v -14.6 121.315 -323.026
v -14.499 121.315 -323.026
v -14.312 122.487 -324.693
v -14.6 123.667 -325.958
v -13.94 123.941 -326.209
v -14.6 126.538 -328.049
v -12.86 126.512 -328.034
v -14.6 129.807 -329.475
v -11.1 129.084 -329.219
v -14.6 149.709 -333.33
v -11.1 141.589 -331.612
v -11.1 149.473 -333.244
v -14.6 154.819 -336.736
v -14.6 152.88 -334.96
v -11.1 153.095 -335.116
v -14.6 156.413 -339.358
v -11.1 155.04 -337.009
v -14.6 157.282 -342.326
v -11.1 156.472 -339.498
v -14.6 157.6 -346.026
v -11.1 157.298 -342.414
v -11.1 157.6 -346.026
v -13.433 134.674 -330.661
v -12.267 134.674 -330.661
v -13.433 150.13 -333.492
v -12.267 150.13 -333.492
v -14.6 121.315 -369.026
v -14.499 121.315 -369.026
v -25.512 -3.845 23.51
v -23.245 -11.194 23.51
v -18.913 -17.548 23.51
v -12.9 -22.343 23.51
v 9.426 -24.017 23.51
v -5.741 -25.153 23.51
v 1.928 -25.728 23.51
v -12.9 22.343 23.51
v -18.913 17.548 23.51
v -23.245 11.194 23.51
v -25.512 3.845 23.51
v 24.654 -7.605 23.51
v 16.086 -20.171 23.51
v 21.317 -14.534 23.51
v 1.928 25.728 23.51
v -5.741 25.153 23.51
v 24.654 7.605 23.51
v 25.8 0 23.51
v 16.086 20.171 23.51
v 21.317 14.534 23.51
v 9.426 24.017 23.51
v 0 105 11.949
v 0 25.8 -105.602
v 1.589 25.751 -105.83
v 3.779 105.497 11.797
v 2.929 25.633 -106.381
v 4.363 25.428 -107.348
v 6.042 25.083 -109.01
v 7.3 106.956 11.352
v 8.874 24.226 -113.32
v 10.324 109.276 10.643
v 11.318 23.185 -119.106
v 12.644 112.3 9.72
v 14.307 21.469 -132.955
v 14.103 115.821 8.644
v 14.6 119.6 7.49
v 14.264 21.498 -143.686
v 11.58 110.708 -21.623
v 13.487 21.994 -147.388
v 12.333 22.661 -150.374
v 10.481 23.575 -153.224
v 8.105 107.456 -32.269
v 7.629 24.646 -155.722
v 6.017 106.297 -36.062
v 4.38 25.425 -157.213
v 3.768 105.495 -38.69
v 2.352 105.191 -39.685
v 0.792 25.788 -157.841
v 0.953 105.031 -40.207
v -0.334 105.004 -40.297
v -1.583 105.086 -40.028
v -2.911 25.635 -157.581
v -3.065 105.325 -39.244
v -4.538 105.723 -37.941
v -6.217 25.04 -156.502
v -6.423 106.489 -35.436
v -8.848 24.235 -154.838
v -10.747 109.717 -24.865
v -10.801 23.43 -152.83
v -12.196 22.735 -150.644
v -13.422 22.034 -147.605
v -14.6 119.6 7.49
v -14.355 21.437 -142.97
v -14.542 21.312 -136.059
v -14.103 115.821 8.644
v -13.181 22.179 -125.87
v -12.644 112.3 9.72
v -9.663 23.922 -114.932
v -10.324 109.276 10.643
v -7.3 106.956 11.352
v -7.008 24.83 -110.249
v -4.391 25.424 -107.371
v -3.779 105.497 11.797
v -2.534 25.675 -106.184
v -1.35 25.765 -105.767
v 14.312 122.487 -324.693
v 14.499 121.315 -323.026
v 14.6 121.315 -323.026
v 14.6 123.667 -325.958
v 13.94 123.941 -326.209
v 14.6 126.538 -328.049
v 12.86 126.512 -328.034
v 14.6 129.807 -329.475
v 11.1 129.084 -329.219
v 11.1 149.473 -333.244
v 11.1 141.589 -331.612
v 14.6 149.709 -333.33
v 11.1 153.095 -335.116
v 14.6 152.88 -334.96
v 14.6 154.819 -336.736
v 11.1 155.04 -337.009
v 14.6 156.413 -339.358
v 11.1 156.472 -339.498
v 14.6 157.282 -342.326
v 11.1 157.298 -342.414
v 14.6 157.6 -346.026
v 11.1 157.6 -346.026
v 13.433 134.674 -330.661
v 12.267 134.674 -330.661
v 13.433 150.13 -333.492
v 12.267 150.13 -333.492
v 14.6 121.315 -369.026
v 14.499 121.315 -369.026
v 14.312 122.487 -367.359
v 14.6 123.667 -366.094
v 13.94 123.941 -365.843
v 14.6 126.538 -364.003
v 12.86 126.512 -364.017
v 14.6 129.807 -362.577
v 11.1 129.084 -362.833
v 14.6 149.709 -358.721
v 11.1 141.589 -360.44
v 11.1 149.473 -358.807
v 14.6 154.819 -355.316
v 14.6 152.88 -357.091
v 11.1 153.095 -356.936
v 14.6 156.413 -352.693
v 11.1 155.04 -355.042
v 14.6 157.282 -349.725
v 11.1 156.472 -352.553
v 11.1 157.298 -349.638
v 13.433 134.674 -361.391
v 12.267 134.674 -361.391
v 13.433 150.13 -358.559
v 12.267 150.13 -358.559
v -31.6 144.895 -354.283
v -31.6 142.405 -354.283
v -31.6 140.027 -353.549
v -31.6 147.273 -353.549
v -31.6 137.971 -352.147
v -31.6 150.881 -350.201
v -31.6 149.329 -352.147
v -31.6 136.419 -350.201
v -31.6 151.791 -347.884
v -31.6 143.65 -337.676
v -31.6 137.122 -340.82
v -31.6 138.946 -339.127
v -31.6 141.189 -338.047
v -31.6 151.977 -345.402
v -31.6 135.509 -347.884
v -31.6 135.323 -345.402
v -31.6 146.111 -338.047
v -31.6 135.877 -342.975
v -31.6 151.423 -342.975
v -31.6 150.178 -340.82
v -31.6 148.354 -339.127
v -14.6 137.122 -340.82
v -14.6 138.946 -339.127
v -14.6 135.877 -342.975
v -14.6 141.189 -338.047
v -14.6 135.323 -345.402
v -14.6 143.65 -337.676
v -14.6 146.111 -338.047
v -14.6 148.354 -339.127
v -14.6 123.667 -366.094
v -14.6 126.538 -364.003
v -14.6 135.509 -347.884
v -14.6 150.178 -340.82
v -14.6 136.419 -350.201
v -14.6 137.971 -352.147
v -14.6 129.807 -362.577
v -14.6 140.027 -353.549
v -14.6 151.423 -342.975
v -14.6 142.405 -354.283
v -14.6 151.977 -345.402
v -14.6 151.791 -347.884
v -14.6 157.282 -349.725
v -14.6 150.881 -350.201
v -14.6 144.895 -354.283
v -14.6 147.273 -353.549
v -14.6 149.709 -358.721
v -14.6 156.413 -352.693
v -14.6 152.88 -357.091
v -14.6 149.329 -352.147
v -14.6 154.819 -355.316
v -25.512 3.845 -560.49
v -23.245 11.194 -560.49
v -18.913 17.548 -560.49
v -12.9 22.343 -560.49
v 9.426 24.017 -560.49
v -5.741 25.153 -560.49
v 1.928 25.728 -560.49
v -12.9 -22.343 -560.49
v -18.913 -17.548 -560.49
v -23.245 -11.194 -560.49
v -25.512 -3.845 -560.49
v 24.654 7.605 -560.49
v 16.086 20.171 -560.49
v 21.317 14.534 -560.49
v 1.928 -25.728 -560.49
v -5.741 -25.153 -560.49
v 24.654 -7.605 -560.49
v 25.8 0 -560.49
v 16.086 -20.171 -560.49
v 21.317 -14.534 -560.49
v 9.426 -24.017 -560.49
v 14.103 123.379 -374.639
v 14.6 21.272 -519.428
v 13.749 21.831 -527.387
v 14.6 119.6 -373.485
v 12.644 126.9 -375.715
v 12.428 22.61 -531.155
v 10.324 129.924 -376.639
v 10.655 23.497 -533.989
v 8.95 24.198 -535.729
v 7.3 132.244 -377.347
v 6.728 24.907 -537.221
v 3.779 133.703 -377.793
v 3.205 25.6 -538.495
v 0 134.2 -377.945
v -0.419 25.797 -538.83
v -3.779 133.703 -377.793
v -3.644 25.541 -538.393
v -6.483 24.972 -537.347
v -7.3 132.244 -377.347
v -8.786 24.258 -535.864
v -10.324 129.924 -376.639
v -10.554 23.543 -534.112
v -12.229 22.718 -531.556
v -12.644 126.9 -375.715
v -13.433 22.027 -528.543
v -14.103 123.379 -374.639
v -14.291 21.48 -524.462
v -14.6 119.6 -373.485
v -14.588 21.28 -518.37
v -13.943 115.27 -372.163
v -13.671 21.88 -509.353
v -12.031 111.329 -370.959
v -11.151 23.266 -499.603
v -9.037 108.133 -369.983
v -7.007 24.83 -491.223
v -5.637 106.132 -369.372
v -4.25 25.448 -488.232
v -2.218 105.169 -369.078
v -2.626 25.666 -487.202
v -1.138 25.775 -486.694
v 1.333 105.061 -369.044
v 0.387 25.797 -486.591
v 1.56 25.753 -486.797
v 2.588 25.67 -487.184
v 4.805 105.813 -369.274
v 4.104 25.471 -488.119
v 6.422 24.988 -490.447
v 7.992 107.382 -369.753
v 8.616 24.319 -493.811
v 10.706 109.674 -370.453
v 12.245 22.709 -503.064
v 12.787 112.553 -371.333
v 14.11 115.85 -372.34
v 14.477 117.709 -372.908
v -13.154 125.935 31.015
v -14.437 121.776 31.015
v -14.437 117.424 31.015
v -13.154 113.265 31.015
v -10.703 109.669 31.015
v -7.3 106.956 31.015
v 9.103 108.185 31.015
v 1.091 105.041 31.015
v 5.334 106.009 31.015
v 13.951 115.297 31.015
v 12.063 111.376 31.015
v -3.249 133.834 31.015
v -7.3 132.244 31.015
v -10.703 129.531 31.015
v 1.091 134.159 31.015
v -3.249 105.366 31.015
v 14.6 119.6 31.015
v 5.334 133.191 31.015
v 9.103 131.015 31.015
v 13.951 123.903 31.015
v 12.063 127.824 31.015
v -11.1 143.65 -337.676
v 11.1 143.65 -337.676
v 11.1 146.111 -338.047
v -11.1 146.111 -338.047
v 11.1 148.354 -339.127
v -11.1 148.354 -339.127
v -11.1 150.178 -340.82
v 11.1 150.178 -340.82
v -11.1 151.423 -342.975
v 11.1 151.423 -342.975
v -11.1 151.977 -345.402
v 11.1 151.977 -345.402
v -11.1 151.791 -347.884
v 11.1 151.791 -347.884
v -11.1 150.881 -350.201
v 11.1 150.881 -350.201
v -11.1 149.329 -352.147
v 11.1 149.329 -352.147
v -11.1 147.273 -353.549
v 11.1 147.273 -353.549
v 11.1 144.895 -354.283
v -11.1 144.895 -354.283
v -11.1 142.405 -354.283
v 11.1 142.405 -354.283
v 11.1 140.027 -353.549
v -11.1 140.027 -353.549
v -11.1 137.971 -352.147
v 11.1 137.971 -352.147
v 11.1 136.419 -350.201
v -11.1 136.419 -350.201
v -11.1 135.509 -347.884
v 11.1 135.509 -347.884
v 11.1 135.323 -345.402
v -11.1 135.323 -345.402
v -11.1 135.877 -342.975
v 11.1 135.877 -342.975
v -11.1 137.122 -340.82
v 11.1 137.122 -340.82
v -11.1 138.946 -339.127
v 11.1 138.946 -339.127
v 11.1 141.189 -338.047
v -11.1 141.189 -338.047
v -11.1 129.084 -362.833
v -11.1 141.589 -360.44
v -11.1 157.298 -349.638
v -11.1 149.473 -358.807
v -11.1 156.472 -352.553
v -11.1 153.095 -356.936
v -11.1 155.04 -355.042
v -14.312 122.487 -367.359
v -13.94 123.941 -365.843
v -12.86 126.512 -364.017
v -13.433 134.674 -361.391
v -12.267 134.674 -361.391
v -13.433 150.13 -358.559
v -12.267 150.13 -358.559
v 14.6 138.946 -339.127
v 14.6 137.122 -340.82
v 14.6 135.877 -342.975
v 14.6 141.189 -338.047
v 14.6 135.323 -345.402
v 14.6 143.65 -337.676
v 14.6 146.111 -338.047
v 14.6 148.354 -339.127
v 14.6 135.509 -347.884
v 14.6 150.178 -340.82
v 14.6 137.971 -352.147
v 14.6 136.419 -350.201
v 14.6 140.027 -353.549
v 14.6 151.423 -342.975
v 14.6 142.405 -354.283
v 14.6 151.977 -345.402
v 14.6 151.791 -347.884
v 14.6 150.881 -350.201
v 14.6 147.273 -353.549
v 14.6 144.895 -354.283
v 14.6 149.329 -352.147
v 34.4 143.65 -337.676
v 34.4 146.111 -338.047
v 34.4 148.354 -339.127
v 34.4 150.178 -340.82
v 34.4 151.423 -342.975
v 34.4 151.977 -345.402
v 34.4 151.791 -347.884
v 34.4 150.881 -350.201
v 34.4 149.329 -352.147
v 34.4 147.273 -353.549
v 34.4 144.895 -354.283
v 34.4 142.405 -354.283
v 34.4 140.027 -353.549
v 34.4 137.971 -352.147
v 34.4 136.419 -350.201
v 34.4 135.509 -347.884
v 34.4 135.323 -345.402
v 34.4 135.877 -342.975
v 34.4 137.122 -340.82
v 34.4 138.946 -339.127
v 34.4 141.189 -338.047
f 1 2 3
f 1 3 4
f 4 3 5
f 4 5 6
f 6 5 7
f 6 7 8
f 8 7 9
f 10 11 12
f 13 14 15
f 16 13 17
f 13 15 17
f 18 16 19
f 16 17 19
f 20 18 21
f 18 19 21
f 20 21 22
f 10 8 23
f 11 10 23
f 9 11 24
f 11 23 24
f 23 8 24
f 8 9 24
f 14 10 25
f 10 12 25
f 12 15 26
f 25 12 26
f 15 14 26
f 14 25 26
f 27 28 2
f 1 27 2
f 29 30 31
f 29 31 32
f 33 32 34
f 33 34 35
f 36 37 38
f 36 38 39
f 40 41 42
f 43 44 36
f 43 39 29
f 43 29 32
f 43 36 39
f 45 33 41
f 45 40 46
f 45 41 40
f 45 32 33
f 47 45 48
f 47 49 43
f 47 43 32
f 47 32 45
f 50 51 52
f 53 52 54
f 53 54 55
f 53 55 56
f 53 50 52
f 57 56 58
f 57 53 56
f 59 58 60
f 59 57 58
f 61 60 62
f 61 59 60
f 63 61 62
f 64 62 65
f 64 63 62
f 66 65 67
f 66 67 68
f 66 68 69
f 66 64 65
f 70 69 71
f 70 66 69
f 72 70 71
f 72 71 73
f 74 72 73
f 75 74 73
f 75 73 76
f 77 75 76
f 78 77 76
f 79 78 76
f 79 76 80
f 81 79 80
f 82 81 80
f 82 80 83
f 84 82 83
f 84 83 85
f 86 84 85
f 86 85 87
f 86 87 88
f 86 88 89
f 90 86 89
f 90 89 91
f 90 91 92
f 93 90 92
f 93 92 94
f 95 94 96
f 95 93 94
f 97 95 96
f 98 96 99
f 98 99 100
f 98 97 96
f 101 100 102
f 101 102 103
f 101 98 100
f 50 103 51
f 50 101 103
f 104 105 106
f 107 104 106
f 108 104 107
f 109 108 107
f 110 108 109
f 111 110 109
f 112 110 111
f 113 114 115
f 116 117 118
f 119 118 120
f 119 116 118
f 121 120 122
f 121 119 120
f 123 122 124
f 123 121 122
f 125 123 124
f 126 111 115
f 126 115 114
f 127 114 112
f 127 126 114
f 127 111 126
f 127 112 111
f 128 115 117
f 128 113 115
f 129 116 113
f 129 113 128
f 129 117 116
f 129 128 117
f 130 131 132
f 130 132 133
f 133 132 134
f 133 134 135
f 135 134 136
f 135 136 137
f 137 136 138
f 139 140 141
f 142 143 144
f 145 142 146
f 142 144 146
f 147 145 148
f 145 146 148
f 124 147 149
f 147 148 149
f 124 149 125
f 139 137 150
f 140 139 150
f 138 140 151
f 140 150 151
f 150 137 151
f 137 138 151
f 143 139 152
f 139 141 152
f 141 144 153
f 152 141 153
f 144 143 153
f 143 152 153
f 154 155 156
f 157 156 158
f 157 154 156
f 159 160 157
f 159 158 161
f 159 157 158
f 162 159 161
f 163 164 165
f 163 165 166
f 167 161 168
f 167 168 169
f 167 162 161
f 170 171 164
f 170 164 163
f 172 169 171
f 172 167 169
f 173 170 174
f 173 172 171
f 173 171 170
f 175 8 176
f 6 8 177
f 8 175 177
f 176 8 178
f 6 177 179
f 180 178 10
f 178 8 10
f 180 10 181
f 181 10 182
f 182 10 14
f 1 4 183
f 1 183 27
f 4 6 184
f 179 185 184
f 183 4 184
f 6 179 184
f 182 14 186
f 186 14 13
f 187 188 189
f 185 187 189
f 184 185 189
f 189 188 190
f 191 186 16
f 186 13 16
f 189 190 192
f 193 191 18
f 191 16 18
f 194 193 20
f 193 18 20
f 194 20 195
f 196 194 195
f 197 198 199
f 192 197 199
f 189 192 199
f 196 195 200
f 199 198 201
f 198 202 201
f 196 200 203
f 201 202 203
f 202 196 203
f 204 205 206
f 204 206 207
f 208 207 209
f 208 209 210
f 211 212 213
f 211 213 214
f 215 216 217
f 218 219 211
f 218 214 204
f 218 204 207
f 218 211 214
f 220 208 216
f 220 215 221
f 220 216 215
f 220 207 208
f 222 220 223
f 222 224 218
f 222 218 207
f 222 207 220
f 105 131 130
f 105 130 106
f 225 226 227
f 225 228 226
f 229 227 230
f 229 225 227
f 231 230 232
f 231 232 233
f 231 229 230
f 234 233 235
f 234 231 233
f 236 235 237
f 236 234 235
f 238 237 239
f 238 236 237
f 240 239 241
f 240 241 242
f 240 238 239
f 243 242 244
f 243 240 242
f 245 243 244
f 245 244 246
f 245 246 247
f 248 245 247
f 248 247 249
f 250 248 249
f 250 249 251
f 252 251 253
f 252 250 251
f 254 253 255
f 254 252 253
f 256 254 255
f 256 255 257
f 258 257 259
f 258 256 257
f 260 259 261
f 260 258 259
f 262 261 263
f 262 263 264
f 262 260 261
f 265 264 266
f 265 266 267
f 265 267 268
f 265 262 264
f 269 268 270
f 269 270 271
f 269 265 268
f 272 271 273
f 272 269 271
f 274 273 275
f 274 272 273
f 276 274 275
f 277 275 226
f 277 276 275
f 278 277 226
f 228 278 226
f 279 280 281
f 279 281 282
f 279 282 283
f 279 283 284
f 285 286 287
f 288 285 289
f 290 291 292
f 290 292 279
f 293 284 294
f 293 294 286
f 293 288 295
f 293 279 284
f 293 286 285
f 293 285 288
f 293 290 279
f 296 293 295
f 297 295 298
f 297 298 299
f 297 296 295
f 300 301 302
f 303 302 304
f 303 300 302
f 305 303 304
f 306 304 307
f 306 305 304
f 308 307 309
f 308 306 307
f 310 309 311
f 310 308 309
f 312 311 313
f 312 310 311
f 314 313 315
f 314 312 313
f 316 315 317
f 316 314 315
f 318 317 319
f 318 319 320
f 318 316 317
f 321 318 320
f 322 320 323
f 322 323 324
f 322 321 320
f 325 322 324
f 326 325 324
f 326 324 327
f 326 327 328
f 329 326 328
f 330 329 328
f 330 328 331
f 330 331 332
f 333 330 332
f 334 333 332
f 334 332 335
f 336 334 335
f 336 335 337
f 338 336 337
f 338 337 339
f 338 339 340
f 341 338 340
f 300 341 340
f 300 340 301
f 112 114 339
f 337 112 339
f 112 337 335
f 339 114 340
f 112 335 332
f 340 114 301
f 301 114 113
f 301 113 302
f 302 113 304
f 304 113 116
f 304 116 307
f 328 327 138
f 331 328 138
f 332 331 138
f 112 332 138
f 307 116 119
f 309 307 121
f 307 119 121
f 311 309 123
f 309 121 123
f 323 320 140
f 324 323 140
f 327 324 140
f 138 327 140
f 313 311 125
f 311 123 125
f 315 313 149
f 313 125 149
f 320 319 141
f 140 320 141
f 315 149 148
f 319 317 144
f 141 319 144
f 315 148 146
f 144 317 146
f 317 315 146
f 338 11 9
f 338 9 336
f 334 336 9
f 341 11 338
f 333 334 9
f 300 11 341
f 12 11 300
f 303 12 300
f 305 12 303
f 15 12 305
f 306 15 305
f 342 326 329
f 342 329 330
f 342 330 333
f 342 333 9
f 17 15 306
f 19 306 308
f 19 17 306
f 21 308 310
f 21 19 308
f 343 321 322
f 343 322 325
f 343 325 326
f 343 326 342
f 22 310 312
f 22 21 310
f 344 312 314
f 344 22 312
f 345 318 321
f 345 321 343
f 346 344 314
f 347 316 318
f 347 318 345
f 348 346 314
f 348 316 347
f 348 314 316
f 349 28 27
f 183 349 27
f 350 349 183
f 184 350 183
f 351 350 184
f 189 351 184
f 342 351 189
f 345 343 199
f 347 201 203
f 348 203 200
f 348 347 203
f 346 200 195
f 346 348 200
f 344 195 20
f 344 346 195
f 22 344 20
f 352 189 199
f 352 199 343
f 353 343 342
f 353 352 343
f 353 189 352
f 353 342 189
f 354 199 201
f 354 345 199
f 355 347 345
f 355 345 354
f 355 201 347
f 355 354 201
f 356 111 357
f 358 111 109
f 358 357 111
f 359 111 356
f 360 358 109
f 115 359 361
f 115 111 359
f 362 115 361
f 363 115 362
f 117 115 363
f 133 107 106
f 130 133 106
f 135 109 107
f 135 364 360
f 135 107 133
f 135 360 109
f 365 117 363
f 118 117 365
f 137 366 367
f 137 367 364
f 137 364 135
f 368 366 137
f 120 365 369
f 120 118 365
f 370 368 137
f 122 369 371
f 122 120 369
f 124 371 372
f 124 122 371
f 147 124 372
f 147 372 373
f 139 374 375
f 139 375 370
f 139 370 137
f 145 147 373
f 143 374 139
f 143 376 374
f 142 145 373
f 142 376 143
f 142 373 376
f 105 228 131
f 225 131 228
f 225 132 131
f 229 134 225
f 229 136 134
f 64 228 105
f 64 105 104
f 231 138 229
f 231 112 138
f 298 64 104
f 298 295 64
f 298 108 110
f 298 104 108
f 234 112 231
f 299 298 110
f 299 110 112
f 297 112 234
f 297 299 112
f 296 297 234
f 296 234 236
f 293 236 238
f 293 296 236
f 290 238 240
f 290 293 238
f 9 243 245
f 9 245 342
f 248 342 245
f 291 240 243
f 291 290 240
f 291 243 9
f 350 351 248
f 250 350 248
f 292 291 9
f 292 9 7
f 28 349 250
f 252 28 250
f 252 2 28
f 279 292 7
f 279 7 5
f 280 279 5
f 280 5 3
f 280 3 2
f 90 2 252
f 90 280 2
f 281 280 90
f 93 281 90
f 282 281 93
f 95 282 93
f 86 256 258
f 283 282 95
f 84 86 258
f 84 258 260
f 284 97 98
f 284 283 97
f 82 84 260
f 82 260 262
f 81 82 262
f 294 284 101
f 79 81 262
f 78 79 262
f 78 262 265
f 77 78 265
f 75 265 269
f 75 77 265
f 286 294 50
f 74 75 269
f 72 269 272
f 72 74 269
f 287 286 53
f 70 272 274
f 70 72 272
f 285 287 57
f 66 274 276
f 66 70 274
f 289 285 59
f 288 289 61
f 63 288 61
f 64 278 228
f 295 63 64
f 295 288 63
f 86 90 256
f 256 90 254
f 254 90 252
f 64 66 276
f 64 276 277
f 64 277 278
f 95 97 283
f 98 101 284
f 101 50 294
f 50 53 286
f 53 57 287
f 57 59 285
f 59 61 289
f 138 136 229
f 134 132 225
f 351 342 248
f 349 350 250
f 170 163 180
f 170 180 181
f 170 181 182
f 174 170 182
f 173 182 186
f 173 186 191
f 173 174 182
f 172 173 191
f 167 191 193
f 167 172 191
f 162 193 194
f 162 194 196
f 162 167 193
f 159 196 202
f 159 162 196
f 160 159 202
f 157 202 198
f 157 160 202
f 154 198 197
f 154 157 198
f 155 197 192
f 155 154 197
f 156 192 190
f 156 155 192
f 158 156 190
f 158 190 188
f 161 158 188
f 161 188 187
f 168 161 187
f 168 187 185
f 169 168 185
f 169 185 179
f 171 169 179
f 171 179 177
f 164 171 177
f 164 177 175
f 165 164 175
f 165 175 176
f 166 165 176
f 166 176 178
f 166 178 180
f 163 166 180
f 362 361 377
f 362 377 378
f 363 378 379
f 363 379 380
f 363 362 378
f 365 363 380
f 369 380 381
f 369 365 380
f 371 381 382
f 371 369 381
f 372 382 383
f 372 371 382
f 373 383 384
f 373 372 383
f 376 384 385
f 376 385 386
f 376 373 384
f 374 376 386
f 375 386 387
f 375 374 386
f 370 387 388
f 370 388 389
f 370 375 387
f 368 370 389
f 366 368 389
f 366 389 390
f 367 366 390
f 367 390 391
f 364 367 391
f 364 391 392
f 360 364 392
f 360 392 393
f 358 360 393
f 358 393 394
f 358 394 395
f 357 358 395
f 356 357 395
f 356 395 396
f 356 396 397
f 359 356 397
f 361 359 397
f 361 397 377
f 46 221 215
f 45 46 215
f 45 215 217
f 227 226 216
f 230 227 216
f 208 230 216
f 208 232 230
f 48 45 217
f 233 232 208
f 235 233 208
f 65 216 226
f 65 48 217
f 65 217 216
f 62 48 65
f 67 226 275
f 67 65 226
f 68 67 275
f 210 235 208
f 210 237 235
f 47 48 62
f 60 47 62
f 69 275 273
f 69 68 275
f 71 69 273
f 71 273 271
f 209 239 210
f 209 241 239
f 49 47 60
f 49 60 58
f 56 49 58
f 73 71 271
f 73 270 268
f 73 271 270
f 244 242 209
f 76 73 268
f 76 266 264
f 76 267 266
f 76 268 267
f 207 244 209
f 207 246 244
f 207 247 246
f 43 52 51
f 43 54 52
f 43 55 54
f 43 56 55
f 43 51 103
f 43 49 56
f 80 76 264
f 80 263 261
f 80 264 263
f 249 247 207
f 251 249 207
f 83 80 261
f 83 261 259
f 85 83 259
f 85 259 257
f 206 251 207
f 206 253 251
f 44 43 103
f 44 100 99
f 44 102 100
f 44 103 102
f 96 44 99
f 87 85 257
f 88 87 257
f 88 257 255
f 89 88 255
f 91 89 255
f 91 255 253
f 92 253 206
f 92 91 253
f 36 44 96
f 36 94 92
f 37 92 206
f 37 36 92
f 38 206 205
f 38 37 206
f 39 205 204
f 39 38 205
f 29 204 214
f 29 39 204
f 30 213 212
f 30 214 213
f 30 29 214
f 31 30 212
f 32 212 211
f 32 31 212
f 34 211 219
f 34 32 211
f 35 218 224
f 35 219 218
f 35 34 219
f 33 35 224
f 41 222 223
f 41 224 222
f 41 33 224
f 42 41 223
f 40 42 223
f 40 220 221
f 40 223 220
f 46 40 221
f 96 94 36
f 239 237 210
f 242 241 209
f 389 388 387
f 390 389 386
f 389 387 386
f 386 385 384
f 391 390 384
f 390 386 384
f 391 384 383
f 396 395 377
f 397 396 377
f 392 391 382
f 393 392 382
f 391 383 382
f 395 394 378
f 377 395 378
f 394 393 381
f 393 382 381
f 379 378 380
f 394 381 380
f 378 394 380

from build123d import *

# Parameters (mm, degrees)
SKETCH1_R                = 25.8
BOSS_EXTRUDE1_DEPTH      = 544
SKETCH6_R                = 14.6
BOSS_EXTRUDE2_REACH      = 541.822
BOSS_EXTRUDE2_END_RADIUS = 25.8
SKETCH4_R                = 14.6
BOSS_EXTRUDE3_START      = -3.5
BOSS_EXTRUDE3_OUTLINE_R  = 8.35
BOSS_EXTRUDE3_DEPTH      = 3.5
BOSS_EXTRUDE4_START      = 17
SKETCH7_3_R              = 8.35
BOSS_EXTRUDE4_DEPTH      = 66
SKETCH9_R                = 25.8
BOSS_EXTRUDE5_DEPTH      = 16.49
BOSS_EXTRUDE6_START      = 23.51
SKETCH10_R               = 25.8
BOSS_EXTRUDE6_DEPTH      = 23.51
BOSS_EXTRUDE7_START      = 4.5
SKETCH11_R               = 14.6
BOSS_EXTRUDE7_DEPTH      = 4.5


# Read off the part's stored shape, not the designer's step: Boss-Extrude3
with BuildPart() as part:
    # Sketch1 → Boss-Extrude1 (new body)
    with BuildSketch(Plane.XY):
        Circle(SKETCH1_R)
    extrude(amount=-BOSS_EXTRUDE1_DEPTH)

    # Sweep2: sweep along a path in Sketch2
    with BuildLine(Plane(origin=(0, 0, 0), x_dir=(0, 0, -1), z_dir=(1, 0, 0))) as sweep2_path:
        Line((535.242725219, 10.616416132), (373.485286901, 119.6))
        Line((373.485286901, 119.6), (-26.514713099, 119.6))
    # Sketch6 → Sweep2 (sweep)
    with BuildSketch(Plane(origin=(0, 10.616416132, -535.242725219), x_dir=(1, 0, 0), z_dir=(0, 0.5587587437797145, 0.8293302516185669))):
        Circle(SKETCH6_R)
    sweep(path=sweep2_path.line, transition=Transition.RIGHT)

    # Boss-Extrude2: up to this cylinder (the profile starts outside it)
    boss_extrude2_end = Plane(origin=(0, 0, 7.489761), z_dir=(0, 0, 1)) * Cylinder(BOSS_EXTRUDE2_END_RADIUS, 1136.244, mode=Mode.PRIVATE)
    # Sketch4 → Boss-Extrude2 (add, up to the surface)
    with BuildSketch(Plane(origin=(0, 296.142134203, -111.454966642), x_dir=(1, 0, 0), z_dir=(0, 0.5587587437797145, 0.8293302516185669)), mode=Mode.PRIVATE) as boss_extrude2_sk1:
        with Locations(Location((0, -212.87313933, 0), (0, 0, 270))):
            Circle(SKETCH4_R)
    boss_extrude2_tool1 = extrude(boss_extrude2_sk1.sketch, amount=-BOSS_EXTRUDE2_REACH, mode=Mode.PRIVATE) - boss_extrude2_end
    add(boss_extrude2_tool1.solids().sort_by_distance((0, 119.6, 7.489761))[0])

    # Boss-Extrude3 outline → Boss-Extrude3 (add)
    with BuildSketch(Plane.ZY.offset(14.6).offset(BOSS_EXTRUDE3_START)):
        with BuildLine():
            add(Edge.make_bspline(
                [(-369.025798161, 121.314868638), (-354.153662916, 130.263805611), (-368.24558028, 157.483504956), (-346.0257981, 157.599948143)],
                knots=[0, 0, 0, 0, 0.999846057, 0.999846057, 0.999846057, 0.999846057], degree=3))
            Line((-369.025798161, 121.314868638), (-323.025798161, 121.314868638))
            add(Edge.make_bspline(
                [(-323.025798161, 121.314868638), (-337.897933379, 130.263805595), (-323.806016093, 157.483504857), (-346.0257981, 157.599948143)],
                knots=[0, 0, 0, 0, 0.999846056, 0.999846056, 0.999846056, 0.999846056], degree=3))
        make_face()
        with Locations((-346.025798161, 143.65)):
            Circle(BOSS_EXTRUDE3_OUTLINE_R, mode=Mode.SUBTRACT)
    boss_extrude3 = extrude(amount=BOSS_EXTRUDE3_DEPTH)

    # Mirror1: Boss-Extrude3 across plane
    add(boss_extrude3.mirror(Plane.ZY))

    # Sketch7<3> → Boss-Extrude4 (add)
    with BuildSketch(Plane.ZY.offset(14.6).offset(BOSS_EXTRUDE4_START)):
        with Locations((-346.025798161, 143.65)):
            Circle(SKETCH7_3_R)
    extrude(amount=-BOSS_EXTRUDE4_DEPTH)

    # Sketch9 → Boss-Extrude5 (add)
    with BuildSketch(Plane(origin=(0, 0, -544), x_dir=(-1, 0, 0), z_dir=(0, 0, -1))):
        with Locations(Location((0, 0, 0), (0, 0, 180))):
            Circle(SKETCH9_R)
    extrude(amount=BOSS_EXTRUDE5_DEPTH)

    # Sketch10 → Boss-Extrude6 (add)
    with BuildSketch(Plane.XY.offset(BOSS_EXTRUDE6_START)):
        Circle(SKETCH10_R)
    extrude(amount=-BOSS_EXTRUDE6_DEPTH)

    # Sketch11 → Boss-Extrude7 (add)
    with BuildSketch(Plane.XY.offset(26.514713099).offset(BOSS_EXTRUDE7_START)):
        with Locations((0, 119.6)):
            Circle(SKETCH11_R)
    extrude(amount=-BOSS_EXTRUDE7_DEPTH)


solid = part.part
